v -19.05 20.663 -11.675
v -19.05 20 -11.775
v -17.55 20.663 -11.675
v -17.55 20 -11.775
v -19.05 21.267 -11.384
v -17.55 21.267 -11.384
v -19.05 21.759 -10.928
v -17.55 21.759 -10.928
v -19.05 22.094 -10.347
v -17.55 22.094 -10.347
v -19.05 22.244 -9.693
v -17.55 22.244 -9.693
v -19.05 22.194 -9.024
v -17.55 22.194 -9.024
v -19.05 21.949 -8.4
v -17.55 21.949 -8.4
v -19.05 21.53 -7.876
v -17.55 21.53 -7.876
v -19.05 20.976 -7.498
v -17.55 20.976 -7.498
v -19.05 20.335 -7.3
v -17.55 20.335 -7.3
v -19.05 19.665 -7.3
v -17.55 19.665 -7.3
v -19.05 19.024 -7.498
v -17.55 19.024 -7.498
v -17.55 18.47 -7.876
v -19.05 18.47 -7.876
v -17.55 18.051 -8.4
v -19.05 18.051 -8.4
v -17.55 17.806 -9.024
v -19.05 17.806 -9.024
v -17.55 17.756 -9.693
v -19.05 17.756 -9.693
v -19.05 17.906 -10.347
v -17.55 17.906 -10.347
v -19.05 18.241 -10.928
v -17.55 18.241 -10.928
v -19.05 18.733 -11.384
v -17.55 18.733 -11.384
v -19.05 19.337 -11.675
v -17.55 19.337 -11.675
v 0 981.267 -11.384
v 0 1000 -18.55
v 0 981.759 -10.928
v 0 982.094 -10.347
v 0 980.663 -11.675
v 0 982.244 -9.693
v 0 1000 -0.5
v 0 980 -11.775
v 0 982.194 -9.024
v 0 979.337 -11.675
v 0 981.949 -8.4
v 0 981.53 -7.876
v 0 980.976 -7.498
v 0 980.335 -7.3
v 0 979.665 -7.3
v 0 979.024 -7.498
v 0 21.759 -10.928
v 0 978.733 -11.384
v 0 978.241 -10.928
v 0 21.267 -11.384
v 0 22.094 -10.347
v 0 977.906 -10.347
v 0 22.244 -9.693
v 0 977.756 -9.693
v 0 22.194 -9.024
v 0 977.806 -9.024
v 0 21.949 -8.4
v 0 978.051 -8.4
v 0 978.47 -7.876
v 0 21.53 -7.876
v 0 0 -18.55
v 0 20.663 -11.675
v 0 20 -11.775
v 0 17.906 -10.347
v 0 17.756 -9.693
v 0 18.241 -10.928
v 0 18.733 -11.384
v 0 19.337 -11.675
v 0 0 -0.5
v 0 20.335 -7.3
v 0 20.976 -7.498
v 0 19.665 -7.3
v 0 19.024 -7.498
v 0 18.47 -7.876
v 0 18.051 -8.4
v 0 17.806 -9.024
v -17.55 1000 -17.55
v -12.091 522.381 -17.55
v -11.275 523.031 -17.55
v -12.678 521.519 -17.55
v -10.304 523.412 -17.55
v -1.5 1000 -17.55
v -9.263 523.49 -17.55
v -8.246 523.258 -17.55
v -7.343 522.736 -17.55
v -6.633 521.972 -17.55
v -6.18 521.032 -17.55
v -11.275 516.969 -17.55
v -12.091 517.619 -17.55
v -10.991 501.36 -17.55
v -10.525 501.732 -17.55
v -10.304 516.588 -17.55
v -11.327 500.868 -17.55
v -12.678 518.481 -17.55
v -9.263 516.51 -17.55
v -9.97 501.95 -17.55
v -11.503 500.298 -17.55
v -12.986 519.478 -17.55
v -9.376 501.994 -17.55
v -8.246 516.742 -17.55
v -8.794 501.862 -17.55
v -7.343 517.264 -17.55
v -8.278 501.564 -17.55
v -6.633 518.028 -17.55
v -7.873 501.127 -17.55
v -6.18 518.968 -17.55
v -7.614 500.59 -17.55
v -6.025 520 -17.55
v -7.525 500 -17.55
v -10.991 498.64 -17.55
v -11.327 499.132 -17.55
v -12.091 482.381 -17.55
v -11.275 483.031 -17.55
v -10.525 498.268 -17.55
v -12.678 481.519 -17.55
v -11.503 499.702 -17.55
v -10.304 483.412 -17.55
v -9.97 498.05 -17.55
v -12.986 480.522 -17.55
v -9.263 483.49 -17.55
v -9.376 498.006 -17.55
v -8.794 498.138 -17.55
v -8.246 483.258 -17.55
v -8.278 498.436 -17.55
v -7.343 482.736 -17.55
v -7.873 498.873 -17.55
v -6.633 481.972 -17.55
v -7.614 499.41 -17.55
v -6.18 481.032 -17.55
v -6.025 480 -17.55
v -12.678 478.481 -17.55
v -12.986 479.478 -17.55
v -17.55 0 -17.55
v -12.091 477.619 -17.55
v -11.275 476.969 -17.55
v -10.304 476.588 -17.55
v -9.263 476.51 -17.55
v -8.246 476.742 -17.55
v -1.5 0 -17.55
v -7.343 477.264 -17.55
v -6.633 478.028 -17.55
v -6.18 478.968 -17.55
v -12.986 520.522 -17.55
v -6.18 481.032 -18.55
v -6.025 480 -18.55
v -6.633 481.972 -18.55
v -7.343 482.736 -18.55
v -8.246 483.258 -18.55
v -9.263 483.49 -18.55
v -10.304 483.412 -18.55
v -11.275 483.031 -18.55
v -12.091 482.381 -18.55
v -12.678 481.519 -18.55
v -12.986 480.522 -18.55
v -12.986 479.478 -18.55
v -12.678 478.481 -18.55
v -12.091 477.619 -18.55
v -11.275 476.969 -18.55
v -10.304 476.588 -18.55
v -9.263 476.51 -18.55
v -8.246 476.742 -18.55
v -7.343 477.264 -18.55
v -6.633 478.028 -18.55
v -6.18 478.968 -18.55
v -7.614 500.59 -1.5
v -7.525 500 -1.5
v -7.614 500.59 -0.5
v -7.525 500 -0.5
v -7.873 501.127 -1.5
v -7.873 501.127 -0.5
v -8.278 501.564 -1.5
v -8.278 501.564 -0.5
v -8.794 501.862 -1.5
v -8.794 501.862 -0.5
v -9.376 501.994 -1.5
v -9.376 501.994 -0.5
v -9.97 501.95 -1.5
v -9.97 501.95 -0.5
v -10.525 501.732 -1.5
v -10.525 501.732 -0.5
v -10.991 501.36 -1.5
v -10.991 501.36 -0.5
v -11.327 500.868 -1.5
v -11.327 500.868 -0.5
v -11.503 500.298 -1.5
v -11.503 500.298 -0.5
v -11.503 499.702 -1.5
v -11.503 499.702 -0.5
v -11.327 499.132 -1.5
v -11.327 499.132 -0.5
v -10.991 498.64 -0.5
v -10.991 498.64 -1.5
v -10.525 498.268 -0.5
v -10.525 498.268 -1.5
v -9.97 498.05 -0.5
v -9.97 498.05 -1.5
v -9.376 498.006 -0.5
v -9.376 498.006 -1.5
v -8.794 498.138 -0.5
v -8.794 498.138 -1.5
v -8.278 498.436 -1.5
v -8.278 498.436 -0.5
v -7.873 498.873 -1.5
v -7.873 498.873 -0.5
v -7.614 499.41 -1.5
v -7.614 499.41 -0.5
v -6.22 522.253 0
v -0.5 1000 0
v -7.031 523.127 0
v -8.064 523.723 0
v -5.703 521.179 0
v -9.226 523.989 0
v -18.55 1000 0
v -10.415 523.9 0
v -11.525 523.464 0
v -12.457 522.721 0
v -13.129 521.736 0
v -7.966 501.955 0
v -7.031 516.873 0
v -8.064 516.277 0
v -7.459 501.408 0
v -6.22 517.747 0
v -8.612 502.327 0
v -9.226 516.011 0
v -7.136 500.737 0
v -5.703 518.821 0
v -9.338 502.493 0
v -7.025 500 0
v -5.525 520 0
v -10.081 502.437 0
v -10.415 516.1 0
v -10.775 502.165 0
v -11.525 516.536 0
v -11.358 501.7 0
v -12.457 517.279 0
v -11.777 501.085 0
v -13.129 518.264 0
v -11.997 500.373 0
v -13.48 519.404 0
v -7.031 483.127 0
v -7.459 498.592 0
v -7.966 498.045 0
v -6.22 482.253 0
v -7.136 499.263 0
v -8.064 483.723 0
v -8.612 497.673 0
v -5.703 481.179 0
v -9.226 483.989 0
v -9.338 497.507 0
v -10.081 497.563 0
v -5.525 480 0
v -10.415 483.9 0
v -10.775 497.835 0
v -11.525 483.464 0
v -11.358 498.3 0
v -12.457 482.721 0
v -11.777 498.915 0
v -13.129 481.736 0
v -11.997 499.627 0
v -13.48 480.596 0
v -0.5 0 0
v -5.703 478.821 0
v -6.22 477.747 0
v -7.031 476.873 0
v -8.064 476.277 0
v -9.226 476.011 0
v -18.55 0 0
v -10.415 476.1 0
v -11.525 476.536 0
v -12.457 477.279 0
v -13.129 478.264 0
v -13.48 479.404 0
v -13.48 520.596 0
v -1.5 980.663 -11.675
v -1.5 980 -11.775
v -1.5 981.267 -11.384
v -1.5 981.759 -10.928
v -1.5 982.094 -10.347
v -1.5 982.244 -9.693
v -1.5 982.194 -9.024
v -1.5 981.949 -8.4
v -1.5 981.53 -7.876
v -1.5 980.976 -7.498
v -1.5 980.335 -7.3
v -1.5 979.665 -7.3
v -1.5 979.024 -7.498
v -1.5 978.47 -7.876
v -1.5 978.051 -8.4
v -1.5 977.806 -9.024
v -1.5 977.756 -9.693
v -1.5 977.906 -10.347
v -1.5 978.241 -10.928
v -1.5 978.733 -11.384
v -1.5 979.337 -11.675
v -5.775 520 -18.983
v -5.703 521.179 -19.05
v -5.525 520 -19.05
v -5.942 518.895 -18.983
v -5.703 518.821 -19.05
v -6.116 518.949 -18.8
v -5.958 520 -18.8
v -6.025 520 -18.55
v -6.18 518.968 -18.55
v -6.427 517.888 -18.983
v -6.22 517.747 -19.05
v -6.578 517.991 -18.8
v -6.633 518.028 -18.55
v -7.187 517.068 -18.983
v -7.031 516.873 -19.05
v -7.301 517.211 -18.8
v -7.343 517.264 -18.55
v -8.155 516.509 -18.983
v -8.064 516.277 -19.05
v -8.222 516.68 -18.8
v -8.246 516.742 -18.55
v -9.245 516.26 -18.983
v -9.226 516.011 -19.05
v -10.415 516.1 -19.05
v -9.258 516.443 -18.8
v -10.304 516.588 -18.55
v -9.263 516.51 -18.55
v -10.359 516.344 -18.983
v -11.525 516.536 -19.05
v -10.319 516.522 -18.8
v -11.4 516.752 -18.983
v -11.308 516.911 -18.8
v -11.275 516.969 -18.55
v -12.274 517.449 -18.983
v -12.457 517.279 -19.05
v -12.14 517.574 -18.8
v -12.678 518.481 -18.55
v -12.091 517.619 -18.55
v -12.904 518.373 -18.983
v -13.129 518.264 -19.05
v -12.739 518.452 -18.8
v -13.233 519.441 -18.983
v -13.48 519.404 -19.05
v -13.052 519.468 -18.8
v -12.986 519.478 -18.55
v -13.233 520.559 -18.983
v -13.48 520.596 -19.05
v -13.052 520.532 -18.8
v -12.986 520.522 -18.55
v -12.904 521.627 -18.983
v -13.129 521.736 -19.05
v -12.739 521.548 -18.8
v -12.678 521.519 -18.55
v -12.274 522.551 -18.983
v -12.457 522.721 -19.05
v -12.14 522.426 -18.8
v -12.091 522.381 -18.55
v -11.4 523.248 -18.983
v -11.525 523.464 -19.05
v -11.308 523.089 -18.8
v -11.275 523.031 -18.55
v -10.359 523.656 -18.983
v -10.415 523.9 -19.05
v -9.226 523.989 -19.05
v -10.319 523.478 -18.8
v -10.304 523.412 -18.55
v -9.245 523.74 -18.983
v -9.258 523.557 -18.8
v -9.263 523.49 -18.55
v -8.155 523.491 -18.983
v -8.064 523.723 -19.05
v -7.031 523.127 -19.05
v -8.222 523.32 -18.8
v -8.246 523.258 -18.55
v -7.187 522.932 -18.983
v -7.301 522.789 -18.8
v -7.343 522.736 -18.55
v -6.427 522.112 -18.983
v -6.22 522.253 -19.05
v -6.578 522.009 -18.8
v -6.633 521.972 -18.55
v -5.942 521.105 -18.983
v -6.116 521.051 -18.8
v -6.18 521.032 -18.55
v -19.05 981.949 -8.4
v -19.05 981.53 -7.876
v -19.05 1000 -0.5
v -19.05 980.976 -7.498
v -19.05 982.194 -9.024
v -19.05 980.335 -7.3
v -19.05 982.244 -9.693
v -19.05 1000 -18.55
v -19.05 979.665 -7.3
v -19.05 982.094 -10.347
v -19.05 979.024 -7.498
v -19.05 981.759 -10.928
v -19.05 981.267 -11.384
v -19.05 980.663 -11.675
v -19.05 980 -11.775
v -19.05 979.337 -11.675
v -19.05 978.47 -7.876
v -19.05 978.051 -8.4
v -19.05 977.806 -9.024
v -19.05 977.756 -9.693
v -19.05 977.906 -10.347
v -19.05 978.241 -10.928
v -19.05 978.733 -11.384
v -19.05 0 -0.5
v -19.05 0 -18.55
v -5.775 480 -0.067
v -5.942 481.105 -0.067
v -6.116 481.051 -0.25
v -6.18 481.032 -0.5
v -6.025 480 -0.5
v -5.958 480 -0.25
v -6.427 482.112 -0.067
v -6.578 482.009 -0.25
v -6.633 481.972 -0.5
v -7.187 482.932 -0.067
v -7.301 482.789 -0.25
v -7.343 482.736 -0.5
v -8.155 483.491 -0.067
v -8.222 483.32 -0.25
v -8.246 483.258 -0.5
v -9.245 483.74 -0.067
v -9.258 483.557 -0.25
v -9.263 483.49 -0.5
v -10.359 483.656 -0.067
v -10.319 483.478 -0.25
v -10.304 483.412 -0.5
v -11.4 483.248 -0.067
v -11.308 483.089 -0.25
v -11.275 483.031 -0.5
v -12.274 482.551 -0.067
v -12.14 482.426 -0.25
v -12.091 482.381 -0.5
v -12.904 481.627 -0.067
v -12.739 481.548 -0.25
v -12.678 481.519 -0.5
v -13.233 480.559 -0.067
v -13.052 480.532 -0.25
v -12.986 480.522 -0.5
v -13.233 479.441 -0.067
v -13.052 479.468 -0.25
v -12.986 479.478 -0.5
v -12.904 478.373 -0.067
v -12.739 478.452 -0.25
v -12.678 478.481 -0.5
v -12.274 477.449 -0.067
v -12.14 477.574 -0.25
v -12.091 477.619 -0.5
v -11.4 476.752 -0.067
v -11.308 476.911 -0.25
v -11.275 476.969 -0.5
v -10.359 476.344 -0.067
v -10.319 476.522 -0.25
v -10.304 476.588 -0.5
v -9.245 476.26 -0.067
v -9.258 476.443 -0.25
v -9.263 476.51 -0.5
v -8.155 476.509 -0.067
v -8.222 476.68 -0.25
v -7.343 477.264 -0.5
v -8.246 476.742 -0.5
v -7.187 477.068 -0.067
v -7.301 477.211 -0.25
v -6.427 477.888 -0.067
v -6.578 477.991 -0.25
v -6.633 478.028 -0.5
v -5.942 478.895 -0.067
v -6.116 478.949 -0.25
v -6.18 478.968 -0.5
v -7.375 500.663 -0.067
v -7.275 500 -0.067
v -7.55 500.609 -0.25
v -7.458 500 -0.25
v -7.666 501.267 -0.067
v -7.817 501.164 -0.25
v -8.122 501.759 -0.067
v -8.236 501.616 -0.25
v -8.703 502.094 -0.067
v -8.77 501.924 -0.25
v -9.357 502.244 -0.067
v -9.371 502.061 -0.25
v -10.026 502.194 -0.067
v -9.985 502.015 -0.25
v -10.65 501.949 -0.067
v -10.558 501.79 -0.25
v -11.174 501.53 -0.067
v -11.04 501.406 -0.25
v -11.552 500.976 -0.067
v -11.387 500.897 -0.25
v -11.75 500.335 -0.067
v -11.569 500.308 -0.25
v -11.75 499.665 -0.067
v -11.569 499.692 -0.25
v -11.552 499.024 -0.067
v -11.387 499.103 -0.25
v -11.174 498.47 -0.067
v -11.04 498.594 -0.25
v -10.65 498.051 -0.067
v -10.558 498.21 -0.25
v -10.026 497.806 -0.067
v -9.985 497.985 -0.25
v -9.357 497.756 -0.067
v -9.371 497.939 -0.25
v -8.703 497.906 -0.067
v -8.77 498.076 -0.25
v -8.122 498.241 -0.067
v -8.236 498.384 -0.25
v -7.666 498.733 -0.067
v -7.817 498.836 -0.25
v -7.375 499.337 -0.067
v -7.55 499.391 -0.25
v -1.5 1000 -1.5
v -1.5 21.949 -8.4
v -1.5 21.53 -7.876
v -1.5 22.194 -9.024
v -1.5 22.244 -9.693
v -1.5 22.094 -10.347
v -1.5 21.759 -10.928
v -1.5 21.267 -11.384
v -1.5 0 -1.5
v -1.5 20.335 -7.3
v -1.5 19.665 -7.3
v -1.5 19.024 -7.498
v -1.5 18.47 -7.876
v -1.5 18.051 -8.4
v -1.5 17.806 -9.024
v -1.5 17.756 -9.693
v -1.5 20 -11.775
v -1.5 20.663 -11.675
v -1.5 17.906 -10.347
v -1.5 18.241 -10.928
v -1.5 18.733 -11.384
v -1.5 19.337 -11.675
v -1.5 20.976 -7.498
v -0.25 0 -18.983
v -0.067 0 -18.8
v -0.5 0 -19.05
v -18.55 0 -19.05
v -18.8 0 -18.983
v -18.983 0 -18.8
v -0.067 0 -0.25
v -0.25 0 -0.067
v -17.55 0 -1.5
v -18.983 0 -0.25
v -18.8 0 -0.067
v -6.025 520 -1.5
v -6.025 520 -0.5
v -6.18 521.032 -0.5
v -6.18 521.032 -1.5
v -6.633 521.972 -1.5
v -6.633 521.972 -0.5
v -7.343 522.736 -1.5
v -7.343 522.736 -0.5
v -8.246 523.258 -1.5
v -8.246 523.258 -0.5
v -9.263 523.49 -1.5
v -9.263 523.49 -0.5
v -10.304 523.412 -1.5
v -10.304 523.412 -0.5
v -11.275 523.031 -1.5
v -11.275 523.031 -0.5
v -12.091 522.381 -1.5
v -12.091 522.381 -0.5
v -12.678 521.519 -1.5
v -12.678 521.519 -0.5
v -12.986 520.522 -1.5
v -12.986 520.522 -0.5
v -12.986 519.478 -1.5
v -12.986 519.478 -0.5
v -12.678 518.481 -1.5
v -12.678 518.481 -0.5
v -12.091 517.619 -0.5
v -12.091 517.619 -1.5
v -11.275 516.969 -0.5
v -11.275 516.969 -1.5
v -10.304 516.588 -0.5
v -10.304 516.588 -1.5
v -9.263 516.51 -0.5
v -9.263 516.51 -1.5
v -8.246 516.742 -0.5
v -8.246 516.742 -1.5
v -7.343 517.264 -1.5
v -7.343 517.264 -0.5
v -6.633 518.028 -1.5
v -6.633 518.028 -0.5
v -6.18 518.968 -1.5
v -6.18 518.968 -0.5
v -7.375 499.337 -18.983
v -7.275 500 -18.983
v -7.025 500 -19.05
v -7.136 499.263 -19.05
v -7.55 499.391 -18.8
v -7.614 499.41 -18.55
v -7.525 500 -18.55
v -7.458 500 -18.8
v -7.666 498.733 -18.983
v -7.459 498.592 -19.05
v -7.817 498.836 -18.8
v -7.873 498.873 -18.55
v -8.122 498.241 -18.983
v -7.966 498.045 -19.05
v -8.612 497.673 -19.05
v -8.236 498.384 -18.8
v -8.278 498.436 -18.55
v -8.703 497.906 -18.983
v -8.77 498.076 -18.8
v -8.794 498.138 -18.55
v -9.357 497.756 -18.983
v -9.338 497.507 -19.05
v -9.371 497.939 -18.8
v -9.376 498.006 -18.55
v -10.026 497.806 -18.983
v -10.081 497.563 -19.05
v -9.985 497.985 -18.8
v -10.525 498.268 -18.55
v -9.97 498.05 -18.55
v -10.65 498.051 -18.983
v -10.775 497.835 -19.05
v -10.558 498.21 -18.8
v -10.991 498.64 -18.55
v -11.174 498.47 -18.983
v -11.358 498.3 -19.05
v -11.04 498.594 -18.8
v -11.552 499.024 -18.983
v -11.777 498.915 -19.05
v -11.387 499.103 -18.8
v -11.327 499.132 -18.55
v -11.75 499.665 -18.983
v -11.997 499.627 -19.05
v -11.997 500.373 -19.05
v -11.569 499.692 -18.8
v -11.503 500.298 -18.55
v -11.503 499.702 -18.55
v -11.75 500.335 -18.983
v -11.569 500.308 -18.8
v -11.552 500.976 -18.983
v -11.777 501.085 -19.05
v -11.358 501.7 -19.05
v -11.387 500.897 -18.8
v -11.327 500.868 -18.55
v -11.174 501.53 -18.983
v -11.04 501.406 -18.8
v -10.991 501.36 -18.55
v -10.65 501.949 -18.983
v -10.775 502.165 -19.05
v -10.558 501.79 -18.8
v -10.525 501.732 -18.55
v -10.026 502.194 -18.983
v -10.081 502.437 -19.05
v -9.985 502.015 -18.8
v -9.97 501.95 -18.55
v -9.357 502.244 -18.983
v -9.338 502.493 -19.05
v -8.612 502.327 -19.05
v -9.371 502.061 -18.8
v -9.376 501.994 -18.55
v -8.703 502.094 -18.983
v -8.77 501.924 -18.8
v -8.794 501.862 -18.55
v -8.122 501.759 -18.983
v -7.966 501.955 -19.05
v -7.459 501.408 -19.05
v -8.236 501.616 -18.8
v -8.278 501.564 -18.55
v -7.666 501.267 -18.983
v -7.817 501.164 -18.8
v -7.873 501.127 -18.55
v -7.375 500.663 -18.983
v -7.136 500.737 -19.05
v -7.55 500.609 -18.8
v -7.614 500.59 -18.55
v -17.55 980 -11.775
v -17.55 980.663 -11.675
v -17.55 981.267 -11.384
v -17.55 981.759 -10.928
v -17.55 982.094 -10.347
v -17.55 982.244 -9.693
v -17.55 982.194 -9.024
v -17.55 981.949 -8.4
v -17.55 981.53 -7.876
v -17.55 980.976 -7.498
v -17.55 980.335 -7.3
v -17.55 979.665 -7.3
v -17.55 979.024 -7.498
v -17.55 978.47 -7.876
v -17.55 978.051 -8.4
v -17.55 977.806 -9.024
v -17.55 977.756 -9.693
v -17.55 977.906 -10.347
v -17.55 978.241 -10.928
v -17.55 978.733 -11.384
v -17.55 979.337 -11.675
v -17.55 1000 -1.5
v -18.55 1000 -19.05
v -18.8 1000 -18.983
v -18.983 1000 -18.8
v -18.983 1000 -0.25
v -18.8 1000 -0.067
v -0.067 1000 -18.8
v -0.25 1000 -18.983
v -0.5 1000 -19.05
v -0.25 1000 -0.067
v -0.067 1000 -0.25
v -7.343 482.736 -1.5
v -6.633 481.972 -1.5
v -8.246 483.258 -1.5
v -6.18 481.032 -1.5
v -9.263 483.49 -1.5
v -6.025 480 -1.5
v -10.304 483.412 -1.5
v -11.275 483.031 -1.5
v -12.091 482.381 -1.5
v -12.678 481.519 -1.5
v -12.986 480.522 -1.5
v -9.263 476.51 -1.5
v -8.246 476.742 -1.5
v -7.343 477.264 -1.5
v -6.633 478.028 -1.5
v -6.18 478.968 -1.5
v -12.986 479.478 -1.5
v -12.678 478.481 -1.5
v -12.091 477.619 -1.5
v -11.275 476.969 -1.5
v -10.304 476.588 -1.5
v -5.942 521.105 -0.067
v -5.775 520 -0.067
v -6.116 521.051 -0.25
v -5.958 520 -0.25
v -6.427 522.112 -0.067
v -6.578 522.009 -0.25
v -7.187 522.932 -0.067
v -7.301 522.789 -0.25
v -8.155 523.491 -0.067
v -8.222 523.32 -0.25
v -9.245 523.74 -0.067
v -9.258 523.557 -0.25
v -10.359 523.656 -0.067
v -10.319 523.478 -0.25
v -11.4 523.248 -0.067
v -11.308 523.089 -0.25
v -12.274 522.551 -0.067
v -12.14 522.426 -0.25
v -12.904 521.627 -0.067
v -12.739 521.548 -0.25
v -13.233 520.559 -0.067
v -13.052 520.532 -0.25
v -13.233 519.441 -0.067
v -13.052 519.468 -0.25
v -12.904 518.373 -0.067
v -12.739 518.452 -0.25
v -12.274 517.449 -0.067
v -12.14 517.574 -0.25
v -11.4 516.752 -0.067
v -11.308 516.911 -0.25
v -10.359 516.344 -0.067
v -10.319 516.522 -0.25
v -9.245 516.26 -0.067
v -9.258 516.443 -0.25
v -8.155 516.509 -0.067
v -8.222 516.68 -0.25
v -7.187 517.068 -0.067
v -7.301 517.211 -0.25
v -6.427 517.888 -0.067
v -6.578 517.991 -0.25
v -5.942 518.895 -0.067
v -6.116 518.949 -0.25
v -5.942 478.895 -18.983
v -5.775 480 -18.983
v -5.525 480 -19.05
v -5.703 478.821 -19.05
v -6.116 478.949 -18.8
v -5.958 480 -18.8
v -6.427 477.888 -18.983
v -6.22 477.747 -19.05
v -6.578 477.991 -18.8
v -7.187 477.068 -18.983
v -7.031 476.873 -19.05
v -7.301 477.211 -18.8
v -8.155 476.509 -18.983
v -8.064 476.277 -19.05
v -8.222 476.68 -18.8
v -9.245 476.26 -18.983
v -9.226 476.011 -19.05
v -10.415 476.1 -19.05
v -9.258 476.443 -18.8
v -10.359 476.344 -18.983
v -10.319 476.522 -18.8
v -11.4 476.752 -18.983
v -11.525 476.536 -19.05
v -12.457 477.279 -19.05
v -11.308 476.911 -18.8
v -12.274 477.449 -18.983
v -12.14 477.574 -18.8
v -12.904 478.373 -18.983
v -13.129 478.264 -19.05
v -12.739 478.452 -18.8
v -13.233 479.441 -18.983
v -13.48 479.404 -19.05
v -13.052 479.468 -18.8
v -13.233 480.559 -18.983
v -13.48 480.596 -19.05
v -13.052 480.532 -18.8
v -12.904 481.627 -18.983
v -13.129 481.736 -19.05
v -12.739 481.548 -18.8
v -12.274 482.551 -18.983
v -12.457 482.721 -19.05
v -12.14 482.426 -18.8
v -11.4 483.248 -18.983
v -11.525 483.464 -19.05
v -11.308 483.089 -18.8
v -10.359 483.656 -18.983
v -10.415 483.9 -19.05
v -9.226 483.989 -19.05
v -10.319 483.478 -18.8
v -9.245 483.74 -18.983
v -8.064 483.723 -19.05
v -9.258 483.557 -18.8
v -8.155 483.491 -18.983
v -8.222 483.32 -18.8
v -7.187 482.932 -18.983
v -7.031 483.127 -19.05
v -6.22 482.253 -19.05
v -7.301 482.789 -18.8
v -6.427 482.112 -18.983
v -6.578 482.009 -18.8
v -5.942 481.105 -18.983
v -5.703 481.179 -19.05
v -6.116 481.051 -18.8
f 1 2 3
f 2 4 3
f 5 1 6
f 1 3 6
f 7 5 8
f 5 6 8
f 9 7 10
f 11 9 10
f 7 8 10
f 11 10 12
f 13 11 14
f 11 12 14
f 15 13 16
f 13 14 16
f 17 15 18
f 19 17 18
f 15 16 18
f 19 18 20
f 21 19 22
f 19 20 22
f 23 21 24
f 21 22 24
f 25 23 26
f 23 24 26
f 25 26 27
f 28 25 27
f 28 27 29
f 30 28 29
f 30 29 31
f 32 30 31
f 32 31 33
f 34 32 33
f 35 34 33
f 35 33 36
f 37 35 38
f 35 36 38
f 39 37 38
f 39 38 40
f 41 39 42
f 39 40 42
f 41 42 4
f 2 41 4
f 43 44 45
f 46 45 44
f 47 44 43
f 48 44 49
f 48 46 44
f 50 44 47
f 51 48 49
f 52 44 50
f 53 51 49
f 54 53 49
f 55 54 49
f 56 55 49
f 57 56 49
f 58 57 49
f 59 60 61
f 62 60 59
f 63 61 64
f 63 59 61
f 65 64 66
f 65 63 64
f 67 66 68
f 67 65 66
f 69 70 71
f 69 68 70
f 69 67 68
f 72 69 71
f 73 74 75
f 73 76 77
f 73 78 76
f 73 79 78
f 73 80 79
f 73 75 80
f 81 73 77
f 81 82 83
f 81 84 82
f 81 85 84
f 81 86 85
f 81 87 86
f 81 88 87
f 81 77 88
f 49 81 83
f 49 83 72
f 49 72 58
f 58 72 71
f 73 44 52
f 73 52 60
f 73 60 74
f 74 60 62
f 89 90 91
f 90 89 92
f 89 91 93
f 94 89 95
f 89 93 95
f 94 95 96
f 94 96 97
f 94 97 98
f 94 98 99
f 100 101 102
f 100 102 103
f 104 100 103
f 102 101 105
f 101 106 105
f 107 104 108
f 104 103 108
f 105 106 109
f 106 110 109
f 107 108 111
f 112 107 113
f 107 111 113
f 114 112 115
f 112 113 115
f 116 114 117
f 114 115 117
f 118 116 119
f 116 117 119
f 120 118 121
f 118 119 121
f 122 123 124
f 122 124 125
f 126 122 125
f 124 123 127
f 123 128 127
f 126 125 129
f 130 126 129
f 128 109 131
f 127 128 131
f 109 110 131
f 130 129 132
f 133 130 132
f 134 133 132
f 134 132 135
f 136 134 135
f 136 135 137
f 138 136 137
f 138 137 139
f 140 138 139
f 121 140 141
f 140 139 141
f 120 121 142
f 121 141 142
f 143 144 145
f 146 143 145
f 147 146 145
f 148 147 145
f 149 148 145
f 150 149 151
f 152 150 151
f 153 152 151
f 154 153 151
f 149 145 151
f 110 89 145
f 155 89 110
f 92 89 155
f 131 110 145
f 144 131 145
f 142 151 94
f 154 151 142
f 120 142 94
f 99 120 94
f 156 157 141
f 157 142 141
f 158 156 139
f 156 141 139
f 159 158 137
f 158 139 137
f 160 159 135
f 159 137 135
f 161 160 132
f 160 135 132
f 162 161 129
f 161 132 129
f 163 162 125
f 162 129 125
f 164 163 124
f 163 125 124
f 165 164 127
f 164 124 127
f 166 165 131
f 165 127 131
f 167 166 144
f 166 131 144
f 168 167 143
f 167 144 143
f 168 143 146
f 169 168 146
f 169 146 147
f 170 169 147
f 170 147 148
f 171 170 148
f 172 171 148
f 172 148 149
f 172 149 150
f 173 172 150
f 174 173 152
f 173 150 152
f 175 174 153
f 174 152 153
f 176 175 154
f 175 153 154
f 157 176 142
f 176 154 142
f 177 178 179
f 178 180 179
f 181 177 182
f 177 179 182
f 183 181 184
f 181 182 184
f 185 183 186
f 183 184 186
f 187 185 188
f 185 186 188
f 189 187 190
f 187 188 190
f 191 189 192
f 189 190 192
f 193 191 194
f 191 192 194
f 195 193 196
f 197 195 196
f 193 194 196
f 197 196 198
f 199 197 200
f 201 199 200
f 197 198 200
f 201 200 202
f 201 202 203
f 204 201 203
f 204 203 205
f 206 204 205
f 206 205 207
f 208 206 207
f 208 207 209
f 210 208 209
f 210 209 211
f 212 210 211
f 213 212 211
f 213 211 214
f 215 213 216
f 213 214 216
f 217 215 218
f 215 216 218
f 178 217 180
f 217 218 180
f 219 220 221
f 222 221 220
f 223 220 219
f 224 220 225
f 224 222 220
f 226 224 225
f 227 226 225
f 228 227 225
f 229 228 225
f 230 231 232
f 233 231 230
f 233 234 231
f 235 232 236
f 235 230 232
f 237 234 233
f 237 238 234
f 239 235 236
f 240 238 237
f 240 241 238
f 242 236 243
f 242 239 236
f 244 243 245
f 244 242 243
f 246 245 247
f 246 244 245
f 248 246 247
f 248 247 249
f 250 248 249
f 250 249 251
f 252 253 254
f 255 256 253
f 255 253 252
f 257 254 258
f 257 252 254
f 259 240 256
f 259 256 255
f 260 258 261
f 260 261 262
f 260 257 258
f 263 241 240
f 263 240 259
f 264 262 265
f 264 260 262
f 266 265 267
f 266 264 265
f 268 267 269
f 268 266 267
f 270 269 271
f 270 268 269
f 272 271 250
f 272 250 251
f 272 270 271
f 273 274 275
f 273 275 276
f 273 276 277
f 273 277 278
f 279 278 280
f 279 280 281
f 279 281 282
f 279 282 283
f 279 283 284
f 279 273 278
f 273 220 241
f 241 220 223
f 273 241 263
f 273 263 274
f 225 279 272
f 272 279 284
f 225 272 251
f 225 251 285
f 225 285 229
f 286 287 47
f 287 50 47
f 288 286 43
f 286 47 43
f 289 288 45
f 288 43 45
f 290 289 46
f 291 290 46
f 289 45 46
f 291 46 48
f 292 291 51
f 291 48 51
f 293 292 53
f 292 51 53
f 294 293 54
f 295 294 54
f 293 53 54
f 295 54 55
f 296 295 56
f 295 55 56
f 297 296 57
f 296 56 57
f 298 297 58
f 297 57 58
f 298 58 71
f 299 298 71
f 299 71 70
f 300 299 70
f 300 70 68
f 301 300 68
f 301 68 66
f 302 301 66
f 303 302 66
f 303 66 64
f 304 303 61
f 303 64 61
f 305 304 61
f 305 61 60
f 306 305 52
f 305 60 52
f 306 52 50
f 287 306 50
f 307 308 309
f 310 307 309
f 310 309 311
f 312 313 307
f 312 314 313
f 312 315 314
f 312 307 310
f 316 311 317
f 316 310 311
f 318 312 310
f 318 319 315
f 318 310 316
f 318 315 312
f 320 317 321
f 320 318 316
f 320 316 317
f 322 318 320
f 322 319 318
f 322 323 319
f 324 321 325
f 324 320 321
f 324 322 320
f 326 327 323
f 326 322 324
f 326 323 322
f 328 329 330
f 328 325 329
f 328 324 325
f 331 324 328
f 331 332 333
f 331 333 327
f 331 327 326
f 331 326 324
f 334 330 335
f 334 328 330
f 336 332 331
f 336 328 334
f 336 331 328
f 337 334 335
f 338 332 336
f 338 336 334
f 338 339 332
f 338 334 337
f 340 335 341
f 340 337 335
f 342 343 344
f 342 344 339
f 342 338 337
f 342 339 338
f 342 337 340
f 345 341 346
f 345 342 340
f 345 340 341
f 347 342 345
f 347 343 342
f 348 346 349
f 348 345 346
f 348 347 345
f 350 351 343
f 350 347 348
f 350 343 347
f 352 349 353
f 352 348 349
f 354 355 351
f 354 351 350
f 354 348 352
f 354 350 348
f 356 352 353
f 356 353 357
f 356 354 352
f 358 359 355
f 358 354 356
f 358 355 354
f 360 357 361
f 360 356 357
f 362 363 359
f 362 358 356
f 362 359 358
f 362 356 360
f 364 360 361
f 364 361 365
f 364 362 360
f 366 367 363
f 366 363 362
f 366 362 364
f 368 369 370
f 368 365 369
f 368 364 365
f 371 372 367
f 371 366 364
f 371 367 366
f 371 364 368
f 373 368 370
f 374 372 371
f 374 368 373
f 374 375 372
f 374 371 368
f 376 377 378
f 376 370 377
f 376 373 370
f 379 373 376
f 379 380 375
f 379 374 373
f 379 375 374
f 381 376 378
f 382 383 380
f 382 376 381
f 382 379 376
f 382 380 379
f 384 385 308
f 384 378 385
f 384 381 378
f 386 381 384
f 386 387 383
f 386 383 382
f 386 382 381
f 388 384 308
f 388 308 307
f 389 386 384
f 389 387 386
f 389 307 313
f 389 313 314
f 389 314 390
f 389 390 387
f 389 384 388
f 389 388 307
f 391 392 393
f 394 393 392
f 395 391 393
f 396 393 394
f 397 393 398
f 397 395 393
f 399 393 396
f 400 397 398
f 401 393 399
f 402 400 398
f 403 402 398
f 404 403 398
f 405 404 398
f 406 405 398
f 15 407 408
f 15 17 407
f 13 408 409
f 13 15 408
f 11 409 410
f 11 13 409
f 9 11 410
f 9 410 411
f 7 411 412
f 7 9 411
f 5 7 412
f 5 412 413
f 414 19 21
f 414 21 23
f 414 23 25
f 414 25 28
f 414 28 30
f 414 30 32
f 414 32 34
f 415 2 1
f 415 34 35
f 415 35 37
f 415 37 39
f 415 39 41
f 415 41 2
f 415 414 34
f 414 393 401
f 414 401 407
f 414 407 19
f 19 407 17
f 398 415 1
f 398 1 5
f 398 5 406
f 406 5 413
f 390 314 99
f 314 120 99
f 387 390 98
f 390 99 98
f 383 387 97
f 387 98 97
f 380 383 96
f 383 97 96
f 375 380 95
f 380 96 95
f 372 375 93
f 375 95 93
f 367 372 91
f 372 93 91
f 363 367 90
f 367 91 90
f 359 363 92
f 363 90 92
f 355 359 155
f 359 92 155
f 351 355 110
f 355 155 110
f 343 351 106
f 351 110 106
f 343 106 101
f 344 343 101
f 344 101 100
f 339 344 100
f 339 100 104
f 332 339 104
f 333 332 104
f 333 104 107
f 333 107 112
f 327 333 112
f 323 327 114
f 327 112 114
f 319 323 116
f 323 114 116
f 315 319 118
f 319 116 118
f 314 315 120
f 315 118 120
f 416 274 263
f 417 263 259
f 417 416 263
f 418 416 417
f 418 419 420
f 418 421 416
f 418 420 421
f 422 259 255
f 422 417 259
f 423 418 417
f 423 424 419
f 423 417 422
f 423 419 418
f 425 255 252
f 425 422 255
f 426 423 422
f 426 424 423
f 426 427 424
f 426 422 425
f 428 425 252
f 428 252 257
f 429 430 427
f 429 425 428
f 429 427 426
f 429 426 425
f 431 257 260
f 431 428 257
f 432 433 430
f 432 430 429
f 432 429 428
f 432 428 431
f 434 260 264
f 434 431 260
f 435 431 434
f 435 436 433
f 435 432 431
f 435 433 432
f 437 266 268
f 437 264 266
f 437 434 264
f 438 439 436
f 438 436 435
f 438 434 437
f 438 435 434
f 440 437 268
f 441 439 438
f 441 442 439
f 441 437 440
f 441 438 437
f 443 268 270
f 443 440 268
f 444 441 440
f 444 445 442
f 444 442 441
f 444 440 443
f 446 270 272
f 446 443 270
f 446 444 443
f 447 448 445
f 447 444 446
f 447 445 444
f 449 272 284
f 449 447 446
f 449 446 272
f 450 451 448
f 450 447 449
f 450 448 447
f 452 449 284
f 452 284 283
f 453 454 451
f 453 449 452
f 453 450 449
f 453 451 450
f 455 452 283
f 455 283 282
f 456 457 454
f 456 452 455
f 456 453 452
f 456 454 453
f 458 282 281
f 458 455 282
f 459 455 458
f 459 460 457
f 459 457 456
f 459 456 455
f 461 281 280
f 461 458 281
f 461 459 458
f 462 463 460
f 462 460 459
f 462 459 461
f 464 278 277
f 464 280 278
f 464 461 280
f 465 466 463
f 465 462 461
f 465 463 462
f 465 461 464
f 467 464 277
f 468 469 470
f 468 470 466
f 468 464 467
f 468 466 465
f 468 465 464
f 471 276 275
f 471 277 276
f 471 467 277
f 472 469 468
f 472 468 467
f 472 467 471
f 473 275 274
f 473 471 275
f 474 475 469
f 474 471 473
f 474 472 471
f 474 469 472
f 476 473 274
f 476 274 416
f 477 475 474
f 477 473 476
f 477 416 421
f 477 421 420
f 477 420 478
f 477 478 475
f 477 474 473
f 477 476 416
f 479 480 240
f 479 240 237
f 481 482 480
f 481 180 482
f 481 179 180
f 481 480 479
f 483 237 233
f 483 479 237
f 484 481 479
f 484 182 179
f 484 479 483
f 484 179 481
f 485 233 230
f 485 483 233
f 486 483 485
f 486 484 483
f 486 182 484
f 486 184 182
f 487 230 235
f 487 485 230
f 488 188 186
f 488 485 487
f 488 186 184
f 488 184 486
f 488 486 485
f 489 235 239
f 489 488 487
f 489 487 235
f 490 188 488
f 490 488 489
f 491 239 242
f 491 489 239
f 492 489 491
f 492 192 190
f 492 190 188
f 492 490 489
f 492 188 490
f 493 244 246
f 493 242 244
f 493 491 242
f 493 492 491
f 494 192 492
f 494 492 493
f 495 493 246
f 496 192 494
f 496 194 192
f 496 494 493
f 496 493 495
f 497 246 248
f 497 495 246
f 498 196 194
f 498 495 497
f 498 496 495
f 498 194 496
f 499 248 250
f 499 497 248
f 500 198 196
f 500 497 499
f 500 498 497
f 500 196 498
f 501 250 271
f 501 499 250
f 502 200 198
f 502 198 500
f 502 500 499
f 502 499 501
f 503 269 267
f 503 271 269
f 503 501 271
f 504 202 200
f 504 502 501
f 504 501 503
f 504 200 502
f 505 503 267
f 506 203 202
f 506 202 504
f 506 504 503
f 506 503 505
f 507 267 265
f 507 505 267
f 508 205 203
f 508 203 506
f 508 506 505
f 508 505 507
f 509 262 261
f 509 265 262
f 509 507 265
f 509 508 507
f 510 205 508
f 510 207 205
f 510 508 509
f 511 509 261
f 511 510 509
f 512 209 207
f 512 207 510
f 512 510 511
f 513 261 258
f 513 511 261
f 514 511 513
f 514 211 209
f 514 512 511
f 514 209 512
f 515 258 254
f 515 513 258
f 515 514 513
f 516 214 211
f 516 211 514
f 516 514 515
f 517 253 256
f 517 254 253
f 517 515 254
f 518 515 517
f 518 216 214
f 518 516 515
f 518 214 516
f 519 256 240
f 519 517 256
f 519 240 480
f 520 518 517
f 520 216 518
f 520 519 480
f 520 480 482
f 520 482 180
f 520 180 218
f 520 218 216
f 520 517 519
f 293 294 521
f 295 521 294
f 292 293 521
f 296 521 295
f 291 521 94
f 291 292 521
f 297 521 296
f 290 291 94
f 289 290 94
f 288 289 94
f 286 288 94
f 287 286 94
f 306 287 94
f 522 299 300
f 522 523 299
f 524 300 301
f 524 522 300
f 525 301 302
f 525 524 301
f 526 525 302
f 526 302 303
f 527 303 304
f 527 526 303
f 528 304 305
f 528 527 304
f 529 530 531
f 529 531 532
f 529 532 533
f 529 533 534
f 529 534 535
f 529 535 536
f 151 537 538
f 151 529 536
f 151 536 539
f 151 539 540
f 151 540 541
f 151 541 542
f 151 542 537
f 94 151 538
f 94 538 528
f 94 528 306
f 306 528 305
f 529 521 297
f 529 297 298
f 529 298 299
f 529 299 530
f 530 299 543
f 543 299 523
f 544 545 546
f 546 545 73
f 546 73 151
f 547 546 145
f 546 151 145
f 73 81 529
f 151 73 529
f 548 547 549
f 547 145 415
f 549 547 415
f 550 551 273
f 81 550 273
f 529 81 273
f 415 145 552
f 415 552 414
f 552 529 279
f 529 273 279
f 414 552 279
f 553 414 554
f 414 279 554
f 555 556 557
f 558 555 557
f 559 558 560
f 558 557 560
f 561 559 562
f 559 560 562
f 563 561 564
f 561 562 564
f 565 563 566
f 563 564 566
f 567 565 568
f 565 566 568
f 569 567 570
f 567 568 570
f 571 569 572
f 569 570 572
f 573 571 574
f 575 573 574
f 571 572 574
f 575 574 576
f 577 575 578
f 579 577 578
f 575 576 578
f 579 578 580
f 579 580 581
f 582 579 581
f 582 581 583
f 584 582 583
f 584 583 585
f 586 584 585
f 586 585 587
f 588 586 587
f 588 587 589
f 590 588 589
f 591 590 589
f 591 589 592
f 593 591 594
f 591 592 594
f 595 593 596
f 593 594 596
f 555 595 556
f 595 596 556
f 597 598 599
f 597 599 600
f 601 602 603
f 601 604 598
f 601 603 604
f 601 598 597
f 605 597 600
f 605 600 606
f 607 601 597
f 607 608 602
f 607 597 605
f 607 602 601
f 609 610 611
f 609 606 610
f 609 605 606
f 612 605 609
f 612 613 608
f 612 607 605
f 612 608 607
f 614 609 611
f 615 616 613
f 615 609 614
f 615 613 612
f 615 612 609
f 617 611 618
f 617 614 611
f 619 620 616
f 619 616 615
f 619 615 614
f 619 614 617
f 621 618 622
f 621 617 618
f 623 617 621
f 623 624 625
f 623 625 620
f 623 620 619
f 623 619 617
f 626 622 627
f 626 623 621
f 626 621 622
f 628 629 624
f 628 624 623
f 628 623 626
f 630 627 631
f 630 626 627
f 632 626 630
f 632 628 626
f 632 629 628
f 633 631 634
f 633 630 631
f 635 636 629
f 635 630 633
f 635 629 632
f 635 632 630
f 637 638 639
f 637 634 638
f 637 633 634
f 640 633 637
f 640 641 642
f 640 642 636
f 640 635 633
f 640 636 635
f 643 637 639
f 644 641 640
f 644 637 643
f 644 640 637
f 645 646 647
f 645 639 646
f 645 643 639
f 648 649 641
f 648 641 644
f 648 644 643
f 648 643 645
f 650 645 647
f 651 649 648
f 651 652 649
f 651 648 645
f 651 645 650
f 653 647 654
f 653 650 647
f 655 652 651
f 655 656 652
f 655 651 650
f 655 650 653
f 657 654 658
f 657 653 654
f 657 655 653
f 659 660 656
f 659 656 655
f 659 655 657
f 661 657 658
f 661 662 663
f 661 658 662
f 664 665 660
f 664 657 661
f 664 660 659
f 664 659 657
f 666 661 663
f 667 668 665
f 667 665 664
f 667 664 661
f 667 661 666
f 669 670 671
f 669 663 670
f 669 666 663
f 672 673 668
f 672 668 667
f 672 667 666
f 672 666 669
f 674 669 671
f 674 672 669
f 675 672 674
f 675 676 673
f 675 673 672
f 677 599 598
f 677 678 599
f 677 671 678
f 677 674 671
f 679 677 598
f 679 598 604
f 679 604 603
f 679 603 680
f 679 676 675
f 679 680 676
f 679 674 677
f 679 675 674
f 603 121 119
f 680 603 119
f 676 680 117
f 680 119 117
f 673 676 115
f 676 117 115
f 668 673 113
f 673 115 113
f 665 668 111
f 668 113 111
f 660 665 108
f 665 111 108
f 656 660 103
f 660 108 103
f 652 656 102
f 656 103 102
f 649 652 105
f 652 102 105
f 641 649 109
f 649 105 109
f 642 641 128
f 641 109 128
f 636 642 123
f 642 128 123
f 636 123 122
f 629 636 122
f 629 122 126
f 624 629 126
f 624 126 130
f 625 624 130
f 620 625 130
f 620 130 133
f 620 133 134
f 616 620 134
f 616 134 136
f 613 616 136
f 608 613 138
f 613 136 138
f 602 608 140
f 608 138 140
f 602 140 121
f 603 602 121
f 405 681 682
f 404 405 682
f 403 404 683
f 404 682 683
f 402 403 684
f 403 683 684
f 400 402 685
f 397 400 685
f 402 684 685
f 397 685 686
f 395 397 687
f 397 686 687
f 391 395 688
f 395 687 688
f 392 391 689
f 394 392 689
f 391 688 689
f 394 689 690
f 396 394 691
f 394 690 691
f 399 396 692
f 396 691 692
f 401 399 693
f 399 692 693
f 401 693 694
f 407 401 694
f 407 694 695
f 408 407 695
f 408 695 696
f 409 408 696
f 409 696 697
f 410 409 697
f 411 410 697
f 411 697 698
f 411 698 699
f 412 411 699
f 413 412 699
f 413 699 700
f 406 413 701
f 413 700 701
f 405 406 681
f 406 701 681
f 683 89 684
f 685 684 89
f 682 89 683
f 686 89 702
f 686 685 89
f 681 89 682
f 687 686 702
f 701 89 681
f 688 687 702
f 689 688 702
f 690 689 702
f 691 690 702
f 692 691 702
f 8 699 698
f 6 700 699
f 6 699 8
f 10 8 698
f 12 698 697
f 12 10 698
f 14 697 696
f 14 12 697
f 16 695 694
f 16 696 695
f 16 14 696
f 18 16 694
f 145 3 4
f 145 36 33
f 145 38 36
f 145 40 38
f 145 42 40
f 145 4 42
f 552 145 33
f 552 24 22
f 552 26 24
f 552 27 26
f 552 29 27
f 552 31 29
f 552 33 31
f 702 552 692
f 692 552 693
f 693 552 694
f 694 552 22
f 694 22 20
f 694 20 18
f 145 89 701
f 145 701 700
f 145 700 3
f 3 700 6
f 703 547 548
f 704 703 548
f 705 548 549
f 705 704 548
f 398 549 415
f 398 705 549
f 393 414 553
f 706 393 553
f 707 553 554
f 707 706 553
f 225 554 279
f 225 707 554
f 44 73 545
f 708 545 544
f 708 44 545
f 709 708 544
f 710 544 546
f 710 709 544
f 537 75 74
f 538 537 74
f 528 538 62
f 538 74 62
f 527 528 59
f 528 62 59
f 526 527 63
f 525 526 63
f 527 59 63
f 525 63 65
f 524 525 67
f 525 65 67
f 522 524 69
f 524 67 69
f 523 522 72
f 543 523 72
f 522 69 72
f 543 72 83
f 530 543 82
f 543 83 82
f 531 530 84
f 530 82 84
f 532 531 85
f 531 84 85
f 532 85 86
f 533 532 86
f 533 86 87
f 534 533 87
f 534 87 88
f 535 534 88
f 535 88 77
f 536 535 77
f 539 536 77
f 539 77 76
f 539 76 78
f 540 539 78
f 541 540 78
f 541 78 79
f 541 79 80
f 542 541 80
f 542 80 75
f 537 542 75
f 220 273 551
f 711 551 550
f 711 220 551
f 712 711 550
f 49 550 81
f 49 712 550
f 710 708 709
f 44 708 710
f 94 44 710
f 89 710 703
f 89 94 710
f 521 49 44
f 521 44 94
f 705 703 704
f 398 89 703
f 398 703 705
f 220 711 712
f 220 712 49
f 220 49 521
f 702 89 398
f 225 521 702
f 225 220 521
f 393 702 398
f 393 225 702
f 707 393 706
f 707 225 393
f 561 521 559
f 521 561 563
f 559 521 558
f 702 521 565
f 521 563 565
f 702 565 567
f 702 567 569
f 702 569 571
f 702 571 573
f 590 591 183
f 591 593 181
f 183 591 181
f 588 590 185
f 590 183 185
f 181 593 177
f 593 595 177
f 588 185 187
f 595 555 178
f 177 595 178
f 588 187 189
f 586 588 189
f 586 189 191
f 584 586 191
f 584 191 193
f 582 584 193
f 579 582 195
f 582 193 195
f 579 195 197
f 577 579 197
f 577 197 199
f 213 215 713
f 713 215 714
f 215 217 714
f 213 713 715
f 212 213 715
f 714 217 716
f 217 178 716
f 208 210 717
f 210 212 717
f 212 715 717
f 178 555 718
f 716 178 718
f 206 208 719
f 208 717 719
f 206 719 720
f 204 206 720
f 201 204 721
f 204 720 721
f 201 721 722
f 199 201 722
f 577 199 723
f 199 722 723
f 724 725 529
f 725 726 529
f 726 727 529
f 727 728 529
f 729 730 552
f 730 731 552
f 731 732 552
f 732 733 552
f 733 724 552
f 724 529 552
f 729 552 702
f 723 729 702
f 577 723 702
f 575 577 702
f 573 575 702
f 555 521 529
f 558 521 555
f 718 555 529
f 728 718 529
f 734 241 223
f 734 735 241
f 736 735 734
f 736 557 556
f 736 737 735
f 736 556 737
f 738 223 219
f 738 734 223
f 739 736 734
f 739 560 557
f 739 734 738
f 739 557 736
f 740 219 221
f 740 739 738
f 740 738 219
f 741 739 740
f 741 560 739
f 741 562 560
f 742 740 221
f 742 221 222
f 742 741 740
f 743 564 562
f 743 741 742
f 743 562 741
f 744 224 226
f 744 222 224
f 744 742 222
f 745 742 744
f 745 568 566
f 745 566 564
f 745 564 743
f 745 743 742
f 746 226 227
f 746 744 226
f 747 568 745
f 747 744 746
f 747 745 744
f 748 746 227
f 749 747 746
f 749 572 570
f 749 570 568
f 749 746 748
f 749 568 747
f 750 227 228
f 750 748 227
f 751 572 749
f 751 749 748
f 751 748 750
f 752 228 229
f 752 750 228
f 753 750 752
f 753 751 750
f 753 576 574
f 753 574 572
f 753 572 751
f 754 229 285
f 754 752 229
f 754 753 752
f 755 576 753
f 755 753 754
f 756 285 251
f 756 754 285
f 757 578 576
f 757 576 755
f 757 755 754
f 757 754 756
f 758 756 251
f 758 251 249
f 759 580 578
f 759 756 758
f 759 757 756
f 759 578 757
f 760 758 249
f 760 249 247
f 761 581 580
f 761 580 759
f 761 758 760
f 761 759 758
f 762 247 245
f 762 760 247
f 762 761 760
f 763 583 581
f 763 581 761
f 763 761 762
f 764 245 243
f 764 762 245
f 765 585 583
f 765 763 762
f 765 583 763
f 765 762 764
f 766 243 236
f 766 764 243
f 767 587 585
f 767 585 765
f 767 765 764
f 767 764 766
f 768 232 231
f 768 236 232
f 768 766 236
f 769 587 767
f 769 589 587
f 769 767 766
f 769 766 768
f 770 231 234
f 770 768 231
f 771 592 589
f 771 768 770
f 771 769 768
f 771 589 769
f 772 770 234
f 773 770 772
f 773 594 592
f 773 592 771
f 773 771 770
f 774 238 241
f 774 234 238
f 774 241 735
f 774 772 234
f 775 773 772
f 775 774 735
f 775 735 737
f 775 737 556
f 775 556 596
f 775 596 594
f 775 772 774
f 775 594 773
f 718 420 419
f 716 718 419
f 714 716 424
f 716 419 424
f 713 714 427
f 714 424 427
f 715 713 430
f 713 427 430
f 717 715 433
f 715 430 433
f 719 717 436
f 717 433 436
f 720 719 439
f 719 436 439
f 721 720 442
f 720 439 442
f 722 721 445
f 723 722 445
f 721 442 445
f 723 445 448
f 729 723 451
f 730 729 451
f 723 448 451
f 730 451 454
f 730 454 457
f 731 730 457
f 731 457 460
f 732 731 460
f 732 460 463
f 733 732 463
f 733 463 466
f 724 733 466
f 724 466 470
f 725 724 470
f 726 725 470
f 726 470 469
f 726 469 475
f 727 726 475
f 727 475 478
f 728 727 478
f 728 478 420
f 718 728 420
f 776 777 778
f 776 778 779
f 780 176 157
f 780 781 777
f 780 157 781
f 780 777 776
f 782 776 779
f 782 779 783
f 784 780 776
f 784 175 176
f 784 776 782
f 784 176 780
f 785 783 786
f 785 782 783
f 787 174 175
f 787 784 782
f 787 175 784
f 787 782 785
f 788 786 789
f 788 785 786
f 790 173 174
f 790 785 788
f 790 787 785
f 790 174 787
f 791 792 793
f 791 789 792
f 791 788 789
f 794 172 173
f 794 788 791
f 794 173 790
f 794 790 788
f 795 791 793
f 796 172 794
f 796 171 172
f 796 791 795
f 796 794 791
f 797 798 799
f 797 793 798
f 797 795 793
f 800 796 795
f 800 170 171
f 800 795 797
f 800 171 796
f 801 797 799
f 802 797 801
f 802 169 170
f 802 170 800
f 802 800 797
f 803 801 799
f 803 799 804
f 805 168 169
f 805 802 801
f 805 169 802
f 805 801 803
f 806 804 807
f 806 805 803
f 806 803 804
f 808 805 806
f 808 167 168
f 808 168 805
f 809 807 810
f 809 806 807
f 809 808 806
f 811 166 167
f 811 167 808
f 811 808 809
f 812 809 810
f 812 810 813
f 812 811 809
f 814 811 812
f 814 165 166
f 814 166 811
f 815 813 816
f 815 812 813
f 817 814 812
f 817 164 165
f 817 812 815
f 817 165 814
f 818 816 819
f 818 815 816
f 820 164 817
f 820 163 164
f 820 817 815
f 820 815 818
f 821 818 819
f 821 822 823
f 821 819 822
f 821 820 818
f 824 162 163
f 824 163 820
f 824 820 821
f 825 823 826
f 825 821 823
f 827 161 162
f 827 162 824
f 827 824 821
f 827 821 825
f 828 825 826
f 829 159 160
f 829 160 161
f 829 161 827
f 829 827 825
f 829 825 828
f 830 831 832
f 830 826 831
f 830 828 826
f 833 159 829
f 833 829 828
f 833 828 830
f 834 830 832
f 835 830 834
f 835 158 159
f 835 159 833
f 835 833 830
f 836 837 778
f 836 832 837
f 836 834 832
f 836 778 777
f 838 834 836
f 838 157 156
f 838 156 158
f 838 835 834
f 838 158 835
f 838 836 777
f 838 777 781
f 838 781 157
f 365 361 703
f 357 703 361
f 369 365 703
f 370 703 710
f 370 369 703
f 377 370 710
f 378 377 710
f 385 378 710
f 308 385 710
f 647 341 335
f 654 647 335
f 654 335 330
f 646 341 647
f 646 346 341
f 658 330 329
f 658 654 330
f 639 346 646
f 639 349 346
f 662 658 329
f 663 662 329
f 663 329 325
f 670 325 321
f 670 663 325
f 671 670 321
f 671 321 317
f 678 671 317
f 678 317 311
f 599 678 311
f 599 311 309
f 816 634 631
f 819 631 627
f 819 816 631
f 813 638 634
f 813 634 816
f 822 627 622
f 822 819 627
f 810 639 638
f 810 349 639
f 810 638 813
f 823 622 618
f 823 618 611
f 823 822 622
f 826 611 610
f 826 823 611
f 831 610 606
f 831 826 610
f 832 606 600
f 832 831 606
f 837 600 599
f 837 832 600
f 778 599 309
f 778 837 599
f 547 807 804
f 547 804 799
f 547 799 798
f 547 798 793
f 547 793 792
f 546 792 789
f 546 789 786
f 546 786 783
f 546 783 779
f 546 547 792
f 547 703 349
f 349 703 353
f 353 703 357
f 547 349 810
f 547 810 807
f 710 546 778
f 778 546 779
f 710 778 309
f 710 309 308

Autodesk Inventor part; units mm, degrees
ref_plane "YZ Plane" through (0, 0, 0) normal (1, 0, 0) x (0, 1, 0)
ref_plane "XZ Plane" through (0, 0, 0) normal (0, 1, 0) x (-1, 0, 0)
ref_plane "XY Plane" through (0, 0, 0) normal (0, 0, 1) x (1, 0, 0)
sketch "Esboço1" plane through (0, 0, 0) normal (0, 1, 0) x (-1, 0, 0)
  line L0 (0, 0) -> (19.05, 0)
  line L1 (19.05, 0) -> (19.05, -19.05)
  line L2 (19.05, -19.05) -> (0, -19.05)
  line L3 (0, -19.05) -> (0, 0)
  line L4 (17.55, -17.55) -> (17.55, -1.5)
  line L5 (1.5, -1.5) -> (17.55, -1.5)
  line L6 (17.55, -17.55) -> (1.5, -17.55)
  line L7 (1.5, -1.5) -> (1.5, -17.55)
  dimension "d1" = 19.05
  dimension "d2" = 19.05
  dimension "d3" = 19.05
extrude "Extrusão1" add sketch "Esboço1" along normal blind 1000
sketch "Esboço2" plane through (-19.05, 0, -19.05) normal (0, 0, -1) x (-1, 0, 0)
  point P0 (-19.05, 0)
sketch "Esboço3" plane through (0, 0, 0) normal (0, 0, 1) x (1, 0, 0)
  line L0 (-19.05, 0) -> (0, 0) projected
  line L1 (0, 0) -> (-19.05, 0)
  line L2 (-9.525, 0) -> (-9.525, 480)
  line L3 (-9.525, 480) -> (-9.525, 520)
  circle A0 centre (-9.525, 480) radius 3.5
  circle A1 centre (-9.525, 520) radius 3.5
  dimension "d15" = 480
  dimension "d16" = 40
  dimension "d17" = 7
  dimension "d18" = 7
extrude "Extrusão2" cut sketch "Esboço3" against normal blind 20
sketch "Esboço4" plane through (0, 0, 0) normal (0, 0, 1) x (1, 0, 0)
  line L0 (-19.05, 0) -> (0, 0)
  line L1 (0, 0) -> (-19.05, 0)
  line L2 (-9.525, 0) -> (-9.525, 480)
  line L3 (-9.525, 480) -> (-9.525, 520)
  circle A0 centre (-9.525, 480) radius 4
  circle A1 centre (-9.525, 520) radius 4
  circle A2 centre (-9.525, 500) radius 2
  dimension "d21" = 480
  dimension "d22" = 40
  dimension "d23" = 8
  dimension "d24" = 8
  dimension "d26" = 4
extrude "Extrusão3" cut sketch "Esboço4" against normal blind 20 contours A2 L3 | L3 A2
fillet "Arredondamento1" radius 0.5 10 edges at (-13.025, 520, 0) (-13.025, 480, 0) (-11.525, 500, 0) (-13.025, 520, -19.05) (-11.525, 500, -19.05) (-13.025, 480, -19.05) (0, 500, -19.05) (-19.05, 500, -19.05) (-19.05, 500, 0) (0, 500, 0)
sketch "Esboço5" plane through (0, 0, -0.5) normal (1, 0, 0) x (0, 0, -1)
  line L0 (17.05, 0) -> (1, 0) projected
  circle A0 centre (9.025, 20) radius 2.25
  line L1 (17.05, 1000) -> (1, 1000) projected
  circle A1 centre (9.025, 980) radius 2.25
  point P0 (-0.5, 0)
  dimension "d31" = 4.5
  dimension "d33" = 4.5
extrude "Extrusão4" cut sketch "Esboço5" against normal blind 20
properties part number "suporte sensores 1m" material "Alumínio 6061"
